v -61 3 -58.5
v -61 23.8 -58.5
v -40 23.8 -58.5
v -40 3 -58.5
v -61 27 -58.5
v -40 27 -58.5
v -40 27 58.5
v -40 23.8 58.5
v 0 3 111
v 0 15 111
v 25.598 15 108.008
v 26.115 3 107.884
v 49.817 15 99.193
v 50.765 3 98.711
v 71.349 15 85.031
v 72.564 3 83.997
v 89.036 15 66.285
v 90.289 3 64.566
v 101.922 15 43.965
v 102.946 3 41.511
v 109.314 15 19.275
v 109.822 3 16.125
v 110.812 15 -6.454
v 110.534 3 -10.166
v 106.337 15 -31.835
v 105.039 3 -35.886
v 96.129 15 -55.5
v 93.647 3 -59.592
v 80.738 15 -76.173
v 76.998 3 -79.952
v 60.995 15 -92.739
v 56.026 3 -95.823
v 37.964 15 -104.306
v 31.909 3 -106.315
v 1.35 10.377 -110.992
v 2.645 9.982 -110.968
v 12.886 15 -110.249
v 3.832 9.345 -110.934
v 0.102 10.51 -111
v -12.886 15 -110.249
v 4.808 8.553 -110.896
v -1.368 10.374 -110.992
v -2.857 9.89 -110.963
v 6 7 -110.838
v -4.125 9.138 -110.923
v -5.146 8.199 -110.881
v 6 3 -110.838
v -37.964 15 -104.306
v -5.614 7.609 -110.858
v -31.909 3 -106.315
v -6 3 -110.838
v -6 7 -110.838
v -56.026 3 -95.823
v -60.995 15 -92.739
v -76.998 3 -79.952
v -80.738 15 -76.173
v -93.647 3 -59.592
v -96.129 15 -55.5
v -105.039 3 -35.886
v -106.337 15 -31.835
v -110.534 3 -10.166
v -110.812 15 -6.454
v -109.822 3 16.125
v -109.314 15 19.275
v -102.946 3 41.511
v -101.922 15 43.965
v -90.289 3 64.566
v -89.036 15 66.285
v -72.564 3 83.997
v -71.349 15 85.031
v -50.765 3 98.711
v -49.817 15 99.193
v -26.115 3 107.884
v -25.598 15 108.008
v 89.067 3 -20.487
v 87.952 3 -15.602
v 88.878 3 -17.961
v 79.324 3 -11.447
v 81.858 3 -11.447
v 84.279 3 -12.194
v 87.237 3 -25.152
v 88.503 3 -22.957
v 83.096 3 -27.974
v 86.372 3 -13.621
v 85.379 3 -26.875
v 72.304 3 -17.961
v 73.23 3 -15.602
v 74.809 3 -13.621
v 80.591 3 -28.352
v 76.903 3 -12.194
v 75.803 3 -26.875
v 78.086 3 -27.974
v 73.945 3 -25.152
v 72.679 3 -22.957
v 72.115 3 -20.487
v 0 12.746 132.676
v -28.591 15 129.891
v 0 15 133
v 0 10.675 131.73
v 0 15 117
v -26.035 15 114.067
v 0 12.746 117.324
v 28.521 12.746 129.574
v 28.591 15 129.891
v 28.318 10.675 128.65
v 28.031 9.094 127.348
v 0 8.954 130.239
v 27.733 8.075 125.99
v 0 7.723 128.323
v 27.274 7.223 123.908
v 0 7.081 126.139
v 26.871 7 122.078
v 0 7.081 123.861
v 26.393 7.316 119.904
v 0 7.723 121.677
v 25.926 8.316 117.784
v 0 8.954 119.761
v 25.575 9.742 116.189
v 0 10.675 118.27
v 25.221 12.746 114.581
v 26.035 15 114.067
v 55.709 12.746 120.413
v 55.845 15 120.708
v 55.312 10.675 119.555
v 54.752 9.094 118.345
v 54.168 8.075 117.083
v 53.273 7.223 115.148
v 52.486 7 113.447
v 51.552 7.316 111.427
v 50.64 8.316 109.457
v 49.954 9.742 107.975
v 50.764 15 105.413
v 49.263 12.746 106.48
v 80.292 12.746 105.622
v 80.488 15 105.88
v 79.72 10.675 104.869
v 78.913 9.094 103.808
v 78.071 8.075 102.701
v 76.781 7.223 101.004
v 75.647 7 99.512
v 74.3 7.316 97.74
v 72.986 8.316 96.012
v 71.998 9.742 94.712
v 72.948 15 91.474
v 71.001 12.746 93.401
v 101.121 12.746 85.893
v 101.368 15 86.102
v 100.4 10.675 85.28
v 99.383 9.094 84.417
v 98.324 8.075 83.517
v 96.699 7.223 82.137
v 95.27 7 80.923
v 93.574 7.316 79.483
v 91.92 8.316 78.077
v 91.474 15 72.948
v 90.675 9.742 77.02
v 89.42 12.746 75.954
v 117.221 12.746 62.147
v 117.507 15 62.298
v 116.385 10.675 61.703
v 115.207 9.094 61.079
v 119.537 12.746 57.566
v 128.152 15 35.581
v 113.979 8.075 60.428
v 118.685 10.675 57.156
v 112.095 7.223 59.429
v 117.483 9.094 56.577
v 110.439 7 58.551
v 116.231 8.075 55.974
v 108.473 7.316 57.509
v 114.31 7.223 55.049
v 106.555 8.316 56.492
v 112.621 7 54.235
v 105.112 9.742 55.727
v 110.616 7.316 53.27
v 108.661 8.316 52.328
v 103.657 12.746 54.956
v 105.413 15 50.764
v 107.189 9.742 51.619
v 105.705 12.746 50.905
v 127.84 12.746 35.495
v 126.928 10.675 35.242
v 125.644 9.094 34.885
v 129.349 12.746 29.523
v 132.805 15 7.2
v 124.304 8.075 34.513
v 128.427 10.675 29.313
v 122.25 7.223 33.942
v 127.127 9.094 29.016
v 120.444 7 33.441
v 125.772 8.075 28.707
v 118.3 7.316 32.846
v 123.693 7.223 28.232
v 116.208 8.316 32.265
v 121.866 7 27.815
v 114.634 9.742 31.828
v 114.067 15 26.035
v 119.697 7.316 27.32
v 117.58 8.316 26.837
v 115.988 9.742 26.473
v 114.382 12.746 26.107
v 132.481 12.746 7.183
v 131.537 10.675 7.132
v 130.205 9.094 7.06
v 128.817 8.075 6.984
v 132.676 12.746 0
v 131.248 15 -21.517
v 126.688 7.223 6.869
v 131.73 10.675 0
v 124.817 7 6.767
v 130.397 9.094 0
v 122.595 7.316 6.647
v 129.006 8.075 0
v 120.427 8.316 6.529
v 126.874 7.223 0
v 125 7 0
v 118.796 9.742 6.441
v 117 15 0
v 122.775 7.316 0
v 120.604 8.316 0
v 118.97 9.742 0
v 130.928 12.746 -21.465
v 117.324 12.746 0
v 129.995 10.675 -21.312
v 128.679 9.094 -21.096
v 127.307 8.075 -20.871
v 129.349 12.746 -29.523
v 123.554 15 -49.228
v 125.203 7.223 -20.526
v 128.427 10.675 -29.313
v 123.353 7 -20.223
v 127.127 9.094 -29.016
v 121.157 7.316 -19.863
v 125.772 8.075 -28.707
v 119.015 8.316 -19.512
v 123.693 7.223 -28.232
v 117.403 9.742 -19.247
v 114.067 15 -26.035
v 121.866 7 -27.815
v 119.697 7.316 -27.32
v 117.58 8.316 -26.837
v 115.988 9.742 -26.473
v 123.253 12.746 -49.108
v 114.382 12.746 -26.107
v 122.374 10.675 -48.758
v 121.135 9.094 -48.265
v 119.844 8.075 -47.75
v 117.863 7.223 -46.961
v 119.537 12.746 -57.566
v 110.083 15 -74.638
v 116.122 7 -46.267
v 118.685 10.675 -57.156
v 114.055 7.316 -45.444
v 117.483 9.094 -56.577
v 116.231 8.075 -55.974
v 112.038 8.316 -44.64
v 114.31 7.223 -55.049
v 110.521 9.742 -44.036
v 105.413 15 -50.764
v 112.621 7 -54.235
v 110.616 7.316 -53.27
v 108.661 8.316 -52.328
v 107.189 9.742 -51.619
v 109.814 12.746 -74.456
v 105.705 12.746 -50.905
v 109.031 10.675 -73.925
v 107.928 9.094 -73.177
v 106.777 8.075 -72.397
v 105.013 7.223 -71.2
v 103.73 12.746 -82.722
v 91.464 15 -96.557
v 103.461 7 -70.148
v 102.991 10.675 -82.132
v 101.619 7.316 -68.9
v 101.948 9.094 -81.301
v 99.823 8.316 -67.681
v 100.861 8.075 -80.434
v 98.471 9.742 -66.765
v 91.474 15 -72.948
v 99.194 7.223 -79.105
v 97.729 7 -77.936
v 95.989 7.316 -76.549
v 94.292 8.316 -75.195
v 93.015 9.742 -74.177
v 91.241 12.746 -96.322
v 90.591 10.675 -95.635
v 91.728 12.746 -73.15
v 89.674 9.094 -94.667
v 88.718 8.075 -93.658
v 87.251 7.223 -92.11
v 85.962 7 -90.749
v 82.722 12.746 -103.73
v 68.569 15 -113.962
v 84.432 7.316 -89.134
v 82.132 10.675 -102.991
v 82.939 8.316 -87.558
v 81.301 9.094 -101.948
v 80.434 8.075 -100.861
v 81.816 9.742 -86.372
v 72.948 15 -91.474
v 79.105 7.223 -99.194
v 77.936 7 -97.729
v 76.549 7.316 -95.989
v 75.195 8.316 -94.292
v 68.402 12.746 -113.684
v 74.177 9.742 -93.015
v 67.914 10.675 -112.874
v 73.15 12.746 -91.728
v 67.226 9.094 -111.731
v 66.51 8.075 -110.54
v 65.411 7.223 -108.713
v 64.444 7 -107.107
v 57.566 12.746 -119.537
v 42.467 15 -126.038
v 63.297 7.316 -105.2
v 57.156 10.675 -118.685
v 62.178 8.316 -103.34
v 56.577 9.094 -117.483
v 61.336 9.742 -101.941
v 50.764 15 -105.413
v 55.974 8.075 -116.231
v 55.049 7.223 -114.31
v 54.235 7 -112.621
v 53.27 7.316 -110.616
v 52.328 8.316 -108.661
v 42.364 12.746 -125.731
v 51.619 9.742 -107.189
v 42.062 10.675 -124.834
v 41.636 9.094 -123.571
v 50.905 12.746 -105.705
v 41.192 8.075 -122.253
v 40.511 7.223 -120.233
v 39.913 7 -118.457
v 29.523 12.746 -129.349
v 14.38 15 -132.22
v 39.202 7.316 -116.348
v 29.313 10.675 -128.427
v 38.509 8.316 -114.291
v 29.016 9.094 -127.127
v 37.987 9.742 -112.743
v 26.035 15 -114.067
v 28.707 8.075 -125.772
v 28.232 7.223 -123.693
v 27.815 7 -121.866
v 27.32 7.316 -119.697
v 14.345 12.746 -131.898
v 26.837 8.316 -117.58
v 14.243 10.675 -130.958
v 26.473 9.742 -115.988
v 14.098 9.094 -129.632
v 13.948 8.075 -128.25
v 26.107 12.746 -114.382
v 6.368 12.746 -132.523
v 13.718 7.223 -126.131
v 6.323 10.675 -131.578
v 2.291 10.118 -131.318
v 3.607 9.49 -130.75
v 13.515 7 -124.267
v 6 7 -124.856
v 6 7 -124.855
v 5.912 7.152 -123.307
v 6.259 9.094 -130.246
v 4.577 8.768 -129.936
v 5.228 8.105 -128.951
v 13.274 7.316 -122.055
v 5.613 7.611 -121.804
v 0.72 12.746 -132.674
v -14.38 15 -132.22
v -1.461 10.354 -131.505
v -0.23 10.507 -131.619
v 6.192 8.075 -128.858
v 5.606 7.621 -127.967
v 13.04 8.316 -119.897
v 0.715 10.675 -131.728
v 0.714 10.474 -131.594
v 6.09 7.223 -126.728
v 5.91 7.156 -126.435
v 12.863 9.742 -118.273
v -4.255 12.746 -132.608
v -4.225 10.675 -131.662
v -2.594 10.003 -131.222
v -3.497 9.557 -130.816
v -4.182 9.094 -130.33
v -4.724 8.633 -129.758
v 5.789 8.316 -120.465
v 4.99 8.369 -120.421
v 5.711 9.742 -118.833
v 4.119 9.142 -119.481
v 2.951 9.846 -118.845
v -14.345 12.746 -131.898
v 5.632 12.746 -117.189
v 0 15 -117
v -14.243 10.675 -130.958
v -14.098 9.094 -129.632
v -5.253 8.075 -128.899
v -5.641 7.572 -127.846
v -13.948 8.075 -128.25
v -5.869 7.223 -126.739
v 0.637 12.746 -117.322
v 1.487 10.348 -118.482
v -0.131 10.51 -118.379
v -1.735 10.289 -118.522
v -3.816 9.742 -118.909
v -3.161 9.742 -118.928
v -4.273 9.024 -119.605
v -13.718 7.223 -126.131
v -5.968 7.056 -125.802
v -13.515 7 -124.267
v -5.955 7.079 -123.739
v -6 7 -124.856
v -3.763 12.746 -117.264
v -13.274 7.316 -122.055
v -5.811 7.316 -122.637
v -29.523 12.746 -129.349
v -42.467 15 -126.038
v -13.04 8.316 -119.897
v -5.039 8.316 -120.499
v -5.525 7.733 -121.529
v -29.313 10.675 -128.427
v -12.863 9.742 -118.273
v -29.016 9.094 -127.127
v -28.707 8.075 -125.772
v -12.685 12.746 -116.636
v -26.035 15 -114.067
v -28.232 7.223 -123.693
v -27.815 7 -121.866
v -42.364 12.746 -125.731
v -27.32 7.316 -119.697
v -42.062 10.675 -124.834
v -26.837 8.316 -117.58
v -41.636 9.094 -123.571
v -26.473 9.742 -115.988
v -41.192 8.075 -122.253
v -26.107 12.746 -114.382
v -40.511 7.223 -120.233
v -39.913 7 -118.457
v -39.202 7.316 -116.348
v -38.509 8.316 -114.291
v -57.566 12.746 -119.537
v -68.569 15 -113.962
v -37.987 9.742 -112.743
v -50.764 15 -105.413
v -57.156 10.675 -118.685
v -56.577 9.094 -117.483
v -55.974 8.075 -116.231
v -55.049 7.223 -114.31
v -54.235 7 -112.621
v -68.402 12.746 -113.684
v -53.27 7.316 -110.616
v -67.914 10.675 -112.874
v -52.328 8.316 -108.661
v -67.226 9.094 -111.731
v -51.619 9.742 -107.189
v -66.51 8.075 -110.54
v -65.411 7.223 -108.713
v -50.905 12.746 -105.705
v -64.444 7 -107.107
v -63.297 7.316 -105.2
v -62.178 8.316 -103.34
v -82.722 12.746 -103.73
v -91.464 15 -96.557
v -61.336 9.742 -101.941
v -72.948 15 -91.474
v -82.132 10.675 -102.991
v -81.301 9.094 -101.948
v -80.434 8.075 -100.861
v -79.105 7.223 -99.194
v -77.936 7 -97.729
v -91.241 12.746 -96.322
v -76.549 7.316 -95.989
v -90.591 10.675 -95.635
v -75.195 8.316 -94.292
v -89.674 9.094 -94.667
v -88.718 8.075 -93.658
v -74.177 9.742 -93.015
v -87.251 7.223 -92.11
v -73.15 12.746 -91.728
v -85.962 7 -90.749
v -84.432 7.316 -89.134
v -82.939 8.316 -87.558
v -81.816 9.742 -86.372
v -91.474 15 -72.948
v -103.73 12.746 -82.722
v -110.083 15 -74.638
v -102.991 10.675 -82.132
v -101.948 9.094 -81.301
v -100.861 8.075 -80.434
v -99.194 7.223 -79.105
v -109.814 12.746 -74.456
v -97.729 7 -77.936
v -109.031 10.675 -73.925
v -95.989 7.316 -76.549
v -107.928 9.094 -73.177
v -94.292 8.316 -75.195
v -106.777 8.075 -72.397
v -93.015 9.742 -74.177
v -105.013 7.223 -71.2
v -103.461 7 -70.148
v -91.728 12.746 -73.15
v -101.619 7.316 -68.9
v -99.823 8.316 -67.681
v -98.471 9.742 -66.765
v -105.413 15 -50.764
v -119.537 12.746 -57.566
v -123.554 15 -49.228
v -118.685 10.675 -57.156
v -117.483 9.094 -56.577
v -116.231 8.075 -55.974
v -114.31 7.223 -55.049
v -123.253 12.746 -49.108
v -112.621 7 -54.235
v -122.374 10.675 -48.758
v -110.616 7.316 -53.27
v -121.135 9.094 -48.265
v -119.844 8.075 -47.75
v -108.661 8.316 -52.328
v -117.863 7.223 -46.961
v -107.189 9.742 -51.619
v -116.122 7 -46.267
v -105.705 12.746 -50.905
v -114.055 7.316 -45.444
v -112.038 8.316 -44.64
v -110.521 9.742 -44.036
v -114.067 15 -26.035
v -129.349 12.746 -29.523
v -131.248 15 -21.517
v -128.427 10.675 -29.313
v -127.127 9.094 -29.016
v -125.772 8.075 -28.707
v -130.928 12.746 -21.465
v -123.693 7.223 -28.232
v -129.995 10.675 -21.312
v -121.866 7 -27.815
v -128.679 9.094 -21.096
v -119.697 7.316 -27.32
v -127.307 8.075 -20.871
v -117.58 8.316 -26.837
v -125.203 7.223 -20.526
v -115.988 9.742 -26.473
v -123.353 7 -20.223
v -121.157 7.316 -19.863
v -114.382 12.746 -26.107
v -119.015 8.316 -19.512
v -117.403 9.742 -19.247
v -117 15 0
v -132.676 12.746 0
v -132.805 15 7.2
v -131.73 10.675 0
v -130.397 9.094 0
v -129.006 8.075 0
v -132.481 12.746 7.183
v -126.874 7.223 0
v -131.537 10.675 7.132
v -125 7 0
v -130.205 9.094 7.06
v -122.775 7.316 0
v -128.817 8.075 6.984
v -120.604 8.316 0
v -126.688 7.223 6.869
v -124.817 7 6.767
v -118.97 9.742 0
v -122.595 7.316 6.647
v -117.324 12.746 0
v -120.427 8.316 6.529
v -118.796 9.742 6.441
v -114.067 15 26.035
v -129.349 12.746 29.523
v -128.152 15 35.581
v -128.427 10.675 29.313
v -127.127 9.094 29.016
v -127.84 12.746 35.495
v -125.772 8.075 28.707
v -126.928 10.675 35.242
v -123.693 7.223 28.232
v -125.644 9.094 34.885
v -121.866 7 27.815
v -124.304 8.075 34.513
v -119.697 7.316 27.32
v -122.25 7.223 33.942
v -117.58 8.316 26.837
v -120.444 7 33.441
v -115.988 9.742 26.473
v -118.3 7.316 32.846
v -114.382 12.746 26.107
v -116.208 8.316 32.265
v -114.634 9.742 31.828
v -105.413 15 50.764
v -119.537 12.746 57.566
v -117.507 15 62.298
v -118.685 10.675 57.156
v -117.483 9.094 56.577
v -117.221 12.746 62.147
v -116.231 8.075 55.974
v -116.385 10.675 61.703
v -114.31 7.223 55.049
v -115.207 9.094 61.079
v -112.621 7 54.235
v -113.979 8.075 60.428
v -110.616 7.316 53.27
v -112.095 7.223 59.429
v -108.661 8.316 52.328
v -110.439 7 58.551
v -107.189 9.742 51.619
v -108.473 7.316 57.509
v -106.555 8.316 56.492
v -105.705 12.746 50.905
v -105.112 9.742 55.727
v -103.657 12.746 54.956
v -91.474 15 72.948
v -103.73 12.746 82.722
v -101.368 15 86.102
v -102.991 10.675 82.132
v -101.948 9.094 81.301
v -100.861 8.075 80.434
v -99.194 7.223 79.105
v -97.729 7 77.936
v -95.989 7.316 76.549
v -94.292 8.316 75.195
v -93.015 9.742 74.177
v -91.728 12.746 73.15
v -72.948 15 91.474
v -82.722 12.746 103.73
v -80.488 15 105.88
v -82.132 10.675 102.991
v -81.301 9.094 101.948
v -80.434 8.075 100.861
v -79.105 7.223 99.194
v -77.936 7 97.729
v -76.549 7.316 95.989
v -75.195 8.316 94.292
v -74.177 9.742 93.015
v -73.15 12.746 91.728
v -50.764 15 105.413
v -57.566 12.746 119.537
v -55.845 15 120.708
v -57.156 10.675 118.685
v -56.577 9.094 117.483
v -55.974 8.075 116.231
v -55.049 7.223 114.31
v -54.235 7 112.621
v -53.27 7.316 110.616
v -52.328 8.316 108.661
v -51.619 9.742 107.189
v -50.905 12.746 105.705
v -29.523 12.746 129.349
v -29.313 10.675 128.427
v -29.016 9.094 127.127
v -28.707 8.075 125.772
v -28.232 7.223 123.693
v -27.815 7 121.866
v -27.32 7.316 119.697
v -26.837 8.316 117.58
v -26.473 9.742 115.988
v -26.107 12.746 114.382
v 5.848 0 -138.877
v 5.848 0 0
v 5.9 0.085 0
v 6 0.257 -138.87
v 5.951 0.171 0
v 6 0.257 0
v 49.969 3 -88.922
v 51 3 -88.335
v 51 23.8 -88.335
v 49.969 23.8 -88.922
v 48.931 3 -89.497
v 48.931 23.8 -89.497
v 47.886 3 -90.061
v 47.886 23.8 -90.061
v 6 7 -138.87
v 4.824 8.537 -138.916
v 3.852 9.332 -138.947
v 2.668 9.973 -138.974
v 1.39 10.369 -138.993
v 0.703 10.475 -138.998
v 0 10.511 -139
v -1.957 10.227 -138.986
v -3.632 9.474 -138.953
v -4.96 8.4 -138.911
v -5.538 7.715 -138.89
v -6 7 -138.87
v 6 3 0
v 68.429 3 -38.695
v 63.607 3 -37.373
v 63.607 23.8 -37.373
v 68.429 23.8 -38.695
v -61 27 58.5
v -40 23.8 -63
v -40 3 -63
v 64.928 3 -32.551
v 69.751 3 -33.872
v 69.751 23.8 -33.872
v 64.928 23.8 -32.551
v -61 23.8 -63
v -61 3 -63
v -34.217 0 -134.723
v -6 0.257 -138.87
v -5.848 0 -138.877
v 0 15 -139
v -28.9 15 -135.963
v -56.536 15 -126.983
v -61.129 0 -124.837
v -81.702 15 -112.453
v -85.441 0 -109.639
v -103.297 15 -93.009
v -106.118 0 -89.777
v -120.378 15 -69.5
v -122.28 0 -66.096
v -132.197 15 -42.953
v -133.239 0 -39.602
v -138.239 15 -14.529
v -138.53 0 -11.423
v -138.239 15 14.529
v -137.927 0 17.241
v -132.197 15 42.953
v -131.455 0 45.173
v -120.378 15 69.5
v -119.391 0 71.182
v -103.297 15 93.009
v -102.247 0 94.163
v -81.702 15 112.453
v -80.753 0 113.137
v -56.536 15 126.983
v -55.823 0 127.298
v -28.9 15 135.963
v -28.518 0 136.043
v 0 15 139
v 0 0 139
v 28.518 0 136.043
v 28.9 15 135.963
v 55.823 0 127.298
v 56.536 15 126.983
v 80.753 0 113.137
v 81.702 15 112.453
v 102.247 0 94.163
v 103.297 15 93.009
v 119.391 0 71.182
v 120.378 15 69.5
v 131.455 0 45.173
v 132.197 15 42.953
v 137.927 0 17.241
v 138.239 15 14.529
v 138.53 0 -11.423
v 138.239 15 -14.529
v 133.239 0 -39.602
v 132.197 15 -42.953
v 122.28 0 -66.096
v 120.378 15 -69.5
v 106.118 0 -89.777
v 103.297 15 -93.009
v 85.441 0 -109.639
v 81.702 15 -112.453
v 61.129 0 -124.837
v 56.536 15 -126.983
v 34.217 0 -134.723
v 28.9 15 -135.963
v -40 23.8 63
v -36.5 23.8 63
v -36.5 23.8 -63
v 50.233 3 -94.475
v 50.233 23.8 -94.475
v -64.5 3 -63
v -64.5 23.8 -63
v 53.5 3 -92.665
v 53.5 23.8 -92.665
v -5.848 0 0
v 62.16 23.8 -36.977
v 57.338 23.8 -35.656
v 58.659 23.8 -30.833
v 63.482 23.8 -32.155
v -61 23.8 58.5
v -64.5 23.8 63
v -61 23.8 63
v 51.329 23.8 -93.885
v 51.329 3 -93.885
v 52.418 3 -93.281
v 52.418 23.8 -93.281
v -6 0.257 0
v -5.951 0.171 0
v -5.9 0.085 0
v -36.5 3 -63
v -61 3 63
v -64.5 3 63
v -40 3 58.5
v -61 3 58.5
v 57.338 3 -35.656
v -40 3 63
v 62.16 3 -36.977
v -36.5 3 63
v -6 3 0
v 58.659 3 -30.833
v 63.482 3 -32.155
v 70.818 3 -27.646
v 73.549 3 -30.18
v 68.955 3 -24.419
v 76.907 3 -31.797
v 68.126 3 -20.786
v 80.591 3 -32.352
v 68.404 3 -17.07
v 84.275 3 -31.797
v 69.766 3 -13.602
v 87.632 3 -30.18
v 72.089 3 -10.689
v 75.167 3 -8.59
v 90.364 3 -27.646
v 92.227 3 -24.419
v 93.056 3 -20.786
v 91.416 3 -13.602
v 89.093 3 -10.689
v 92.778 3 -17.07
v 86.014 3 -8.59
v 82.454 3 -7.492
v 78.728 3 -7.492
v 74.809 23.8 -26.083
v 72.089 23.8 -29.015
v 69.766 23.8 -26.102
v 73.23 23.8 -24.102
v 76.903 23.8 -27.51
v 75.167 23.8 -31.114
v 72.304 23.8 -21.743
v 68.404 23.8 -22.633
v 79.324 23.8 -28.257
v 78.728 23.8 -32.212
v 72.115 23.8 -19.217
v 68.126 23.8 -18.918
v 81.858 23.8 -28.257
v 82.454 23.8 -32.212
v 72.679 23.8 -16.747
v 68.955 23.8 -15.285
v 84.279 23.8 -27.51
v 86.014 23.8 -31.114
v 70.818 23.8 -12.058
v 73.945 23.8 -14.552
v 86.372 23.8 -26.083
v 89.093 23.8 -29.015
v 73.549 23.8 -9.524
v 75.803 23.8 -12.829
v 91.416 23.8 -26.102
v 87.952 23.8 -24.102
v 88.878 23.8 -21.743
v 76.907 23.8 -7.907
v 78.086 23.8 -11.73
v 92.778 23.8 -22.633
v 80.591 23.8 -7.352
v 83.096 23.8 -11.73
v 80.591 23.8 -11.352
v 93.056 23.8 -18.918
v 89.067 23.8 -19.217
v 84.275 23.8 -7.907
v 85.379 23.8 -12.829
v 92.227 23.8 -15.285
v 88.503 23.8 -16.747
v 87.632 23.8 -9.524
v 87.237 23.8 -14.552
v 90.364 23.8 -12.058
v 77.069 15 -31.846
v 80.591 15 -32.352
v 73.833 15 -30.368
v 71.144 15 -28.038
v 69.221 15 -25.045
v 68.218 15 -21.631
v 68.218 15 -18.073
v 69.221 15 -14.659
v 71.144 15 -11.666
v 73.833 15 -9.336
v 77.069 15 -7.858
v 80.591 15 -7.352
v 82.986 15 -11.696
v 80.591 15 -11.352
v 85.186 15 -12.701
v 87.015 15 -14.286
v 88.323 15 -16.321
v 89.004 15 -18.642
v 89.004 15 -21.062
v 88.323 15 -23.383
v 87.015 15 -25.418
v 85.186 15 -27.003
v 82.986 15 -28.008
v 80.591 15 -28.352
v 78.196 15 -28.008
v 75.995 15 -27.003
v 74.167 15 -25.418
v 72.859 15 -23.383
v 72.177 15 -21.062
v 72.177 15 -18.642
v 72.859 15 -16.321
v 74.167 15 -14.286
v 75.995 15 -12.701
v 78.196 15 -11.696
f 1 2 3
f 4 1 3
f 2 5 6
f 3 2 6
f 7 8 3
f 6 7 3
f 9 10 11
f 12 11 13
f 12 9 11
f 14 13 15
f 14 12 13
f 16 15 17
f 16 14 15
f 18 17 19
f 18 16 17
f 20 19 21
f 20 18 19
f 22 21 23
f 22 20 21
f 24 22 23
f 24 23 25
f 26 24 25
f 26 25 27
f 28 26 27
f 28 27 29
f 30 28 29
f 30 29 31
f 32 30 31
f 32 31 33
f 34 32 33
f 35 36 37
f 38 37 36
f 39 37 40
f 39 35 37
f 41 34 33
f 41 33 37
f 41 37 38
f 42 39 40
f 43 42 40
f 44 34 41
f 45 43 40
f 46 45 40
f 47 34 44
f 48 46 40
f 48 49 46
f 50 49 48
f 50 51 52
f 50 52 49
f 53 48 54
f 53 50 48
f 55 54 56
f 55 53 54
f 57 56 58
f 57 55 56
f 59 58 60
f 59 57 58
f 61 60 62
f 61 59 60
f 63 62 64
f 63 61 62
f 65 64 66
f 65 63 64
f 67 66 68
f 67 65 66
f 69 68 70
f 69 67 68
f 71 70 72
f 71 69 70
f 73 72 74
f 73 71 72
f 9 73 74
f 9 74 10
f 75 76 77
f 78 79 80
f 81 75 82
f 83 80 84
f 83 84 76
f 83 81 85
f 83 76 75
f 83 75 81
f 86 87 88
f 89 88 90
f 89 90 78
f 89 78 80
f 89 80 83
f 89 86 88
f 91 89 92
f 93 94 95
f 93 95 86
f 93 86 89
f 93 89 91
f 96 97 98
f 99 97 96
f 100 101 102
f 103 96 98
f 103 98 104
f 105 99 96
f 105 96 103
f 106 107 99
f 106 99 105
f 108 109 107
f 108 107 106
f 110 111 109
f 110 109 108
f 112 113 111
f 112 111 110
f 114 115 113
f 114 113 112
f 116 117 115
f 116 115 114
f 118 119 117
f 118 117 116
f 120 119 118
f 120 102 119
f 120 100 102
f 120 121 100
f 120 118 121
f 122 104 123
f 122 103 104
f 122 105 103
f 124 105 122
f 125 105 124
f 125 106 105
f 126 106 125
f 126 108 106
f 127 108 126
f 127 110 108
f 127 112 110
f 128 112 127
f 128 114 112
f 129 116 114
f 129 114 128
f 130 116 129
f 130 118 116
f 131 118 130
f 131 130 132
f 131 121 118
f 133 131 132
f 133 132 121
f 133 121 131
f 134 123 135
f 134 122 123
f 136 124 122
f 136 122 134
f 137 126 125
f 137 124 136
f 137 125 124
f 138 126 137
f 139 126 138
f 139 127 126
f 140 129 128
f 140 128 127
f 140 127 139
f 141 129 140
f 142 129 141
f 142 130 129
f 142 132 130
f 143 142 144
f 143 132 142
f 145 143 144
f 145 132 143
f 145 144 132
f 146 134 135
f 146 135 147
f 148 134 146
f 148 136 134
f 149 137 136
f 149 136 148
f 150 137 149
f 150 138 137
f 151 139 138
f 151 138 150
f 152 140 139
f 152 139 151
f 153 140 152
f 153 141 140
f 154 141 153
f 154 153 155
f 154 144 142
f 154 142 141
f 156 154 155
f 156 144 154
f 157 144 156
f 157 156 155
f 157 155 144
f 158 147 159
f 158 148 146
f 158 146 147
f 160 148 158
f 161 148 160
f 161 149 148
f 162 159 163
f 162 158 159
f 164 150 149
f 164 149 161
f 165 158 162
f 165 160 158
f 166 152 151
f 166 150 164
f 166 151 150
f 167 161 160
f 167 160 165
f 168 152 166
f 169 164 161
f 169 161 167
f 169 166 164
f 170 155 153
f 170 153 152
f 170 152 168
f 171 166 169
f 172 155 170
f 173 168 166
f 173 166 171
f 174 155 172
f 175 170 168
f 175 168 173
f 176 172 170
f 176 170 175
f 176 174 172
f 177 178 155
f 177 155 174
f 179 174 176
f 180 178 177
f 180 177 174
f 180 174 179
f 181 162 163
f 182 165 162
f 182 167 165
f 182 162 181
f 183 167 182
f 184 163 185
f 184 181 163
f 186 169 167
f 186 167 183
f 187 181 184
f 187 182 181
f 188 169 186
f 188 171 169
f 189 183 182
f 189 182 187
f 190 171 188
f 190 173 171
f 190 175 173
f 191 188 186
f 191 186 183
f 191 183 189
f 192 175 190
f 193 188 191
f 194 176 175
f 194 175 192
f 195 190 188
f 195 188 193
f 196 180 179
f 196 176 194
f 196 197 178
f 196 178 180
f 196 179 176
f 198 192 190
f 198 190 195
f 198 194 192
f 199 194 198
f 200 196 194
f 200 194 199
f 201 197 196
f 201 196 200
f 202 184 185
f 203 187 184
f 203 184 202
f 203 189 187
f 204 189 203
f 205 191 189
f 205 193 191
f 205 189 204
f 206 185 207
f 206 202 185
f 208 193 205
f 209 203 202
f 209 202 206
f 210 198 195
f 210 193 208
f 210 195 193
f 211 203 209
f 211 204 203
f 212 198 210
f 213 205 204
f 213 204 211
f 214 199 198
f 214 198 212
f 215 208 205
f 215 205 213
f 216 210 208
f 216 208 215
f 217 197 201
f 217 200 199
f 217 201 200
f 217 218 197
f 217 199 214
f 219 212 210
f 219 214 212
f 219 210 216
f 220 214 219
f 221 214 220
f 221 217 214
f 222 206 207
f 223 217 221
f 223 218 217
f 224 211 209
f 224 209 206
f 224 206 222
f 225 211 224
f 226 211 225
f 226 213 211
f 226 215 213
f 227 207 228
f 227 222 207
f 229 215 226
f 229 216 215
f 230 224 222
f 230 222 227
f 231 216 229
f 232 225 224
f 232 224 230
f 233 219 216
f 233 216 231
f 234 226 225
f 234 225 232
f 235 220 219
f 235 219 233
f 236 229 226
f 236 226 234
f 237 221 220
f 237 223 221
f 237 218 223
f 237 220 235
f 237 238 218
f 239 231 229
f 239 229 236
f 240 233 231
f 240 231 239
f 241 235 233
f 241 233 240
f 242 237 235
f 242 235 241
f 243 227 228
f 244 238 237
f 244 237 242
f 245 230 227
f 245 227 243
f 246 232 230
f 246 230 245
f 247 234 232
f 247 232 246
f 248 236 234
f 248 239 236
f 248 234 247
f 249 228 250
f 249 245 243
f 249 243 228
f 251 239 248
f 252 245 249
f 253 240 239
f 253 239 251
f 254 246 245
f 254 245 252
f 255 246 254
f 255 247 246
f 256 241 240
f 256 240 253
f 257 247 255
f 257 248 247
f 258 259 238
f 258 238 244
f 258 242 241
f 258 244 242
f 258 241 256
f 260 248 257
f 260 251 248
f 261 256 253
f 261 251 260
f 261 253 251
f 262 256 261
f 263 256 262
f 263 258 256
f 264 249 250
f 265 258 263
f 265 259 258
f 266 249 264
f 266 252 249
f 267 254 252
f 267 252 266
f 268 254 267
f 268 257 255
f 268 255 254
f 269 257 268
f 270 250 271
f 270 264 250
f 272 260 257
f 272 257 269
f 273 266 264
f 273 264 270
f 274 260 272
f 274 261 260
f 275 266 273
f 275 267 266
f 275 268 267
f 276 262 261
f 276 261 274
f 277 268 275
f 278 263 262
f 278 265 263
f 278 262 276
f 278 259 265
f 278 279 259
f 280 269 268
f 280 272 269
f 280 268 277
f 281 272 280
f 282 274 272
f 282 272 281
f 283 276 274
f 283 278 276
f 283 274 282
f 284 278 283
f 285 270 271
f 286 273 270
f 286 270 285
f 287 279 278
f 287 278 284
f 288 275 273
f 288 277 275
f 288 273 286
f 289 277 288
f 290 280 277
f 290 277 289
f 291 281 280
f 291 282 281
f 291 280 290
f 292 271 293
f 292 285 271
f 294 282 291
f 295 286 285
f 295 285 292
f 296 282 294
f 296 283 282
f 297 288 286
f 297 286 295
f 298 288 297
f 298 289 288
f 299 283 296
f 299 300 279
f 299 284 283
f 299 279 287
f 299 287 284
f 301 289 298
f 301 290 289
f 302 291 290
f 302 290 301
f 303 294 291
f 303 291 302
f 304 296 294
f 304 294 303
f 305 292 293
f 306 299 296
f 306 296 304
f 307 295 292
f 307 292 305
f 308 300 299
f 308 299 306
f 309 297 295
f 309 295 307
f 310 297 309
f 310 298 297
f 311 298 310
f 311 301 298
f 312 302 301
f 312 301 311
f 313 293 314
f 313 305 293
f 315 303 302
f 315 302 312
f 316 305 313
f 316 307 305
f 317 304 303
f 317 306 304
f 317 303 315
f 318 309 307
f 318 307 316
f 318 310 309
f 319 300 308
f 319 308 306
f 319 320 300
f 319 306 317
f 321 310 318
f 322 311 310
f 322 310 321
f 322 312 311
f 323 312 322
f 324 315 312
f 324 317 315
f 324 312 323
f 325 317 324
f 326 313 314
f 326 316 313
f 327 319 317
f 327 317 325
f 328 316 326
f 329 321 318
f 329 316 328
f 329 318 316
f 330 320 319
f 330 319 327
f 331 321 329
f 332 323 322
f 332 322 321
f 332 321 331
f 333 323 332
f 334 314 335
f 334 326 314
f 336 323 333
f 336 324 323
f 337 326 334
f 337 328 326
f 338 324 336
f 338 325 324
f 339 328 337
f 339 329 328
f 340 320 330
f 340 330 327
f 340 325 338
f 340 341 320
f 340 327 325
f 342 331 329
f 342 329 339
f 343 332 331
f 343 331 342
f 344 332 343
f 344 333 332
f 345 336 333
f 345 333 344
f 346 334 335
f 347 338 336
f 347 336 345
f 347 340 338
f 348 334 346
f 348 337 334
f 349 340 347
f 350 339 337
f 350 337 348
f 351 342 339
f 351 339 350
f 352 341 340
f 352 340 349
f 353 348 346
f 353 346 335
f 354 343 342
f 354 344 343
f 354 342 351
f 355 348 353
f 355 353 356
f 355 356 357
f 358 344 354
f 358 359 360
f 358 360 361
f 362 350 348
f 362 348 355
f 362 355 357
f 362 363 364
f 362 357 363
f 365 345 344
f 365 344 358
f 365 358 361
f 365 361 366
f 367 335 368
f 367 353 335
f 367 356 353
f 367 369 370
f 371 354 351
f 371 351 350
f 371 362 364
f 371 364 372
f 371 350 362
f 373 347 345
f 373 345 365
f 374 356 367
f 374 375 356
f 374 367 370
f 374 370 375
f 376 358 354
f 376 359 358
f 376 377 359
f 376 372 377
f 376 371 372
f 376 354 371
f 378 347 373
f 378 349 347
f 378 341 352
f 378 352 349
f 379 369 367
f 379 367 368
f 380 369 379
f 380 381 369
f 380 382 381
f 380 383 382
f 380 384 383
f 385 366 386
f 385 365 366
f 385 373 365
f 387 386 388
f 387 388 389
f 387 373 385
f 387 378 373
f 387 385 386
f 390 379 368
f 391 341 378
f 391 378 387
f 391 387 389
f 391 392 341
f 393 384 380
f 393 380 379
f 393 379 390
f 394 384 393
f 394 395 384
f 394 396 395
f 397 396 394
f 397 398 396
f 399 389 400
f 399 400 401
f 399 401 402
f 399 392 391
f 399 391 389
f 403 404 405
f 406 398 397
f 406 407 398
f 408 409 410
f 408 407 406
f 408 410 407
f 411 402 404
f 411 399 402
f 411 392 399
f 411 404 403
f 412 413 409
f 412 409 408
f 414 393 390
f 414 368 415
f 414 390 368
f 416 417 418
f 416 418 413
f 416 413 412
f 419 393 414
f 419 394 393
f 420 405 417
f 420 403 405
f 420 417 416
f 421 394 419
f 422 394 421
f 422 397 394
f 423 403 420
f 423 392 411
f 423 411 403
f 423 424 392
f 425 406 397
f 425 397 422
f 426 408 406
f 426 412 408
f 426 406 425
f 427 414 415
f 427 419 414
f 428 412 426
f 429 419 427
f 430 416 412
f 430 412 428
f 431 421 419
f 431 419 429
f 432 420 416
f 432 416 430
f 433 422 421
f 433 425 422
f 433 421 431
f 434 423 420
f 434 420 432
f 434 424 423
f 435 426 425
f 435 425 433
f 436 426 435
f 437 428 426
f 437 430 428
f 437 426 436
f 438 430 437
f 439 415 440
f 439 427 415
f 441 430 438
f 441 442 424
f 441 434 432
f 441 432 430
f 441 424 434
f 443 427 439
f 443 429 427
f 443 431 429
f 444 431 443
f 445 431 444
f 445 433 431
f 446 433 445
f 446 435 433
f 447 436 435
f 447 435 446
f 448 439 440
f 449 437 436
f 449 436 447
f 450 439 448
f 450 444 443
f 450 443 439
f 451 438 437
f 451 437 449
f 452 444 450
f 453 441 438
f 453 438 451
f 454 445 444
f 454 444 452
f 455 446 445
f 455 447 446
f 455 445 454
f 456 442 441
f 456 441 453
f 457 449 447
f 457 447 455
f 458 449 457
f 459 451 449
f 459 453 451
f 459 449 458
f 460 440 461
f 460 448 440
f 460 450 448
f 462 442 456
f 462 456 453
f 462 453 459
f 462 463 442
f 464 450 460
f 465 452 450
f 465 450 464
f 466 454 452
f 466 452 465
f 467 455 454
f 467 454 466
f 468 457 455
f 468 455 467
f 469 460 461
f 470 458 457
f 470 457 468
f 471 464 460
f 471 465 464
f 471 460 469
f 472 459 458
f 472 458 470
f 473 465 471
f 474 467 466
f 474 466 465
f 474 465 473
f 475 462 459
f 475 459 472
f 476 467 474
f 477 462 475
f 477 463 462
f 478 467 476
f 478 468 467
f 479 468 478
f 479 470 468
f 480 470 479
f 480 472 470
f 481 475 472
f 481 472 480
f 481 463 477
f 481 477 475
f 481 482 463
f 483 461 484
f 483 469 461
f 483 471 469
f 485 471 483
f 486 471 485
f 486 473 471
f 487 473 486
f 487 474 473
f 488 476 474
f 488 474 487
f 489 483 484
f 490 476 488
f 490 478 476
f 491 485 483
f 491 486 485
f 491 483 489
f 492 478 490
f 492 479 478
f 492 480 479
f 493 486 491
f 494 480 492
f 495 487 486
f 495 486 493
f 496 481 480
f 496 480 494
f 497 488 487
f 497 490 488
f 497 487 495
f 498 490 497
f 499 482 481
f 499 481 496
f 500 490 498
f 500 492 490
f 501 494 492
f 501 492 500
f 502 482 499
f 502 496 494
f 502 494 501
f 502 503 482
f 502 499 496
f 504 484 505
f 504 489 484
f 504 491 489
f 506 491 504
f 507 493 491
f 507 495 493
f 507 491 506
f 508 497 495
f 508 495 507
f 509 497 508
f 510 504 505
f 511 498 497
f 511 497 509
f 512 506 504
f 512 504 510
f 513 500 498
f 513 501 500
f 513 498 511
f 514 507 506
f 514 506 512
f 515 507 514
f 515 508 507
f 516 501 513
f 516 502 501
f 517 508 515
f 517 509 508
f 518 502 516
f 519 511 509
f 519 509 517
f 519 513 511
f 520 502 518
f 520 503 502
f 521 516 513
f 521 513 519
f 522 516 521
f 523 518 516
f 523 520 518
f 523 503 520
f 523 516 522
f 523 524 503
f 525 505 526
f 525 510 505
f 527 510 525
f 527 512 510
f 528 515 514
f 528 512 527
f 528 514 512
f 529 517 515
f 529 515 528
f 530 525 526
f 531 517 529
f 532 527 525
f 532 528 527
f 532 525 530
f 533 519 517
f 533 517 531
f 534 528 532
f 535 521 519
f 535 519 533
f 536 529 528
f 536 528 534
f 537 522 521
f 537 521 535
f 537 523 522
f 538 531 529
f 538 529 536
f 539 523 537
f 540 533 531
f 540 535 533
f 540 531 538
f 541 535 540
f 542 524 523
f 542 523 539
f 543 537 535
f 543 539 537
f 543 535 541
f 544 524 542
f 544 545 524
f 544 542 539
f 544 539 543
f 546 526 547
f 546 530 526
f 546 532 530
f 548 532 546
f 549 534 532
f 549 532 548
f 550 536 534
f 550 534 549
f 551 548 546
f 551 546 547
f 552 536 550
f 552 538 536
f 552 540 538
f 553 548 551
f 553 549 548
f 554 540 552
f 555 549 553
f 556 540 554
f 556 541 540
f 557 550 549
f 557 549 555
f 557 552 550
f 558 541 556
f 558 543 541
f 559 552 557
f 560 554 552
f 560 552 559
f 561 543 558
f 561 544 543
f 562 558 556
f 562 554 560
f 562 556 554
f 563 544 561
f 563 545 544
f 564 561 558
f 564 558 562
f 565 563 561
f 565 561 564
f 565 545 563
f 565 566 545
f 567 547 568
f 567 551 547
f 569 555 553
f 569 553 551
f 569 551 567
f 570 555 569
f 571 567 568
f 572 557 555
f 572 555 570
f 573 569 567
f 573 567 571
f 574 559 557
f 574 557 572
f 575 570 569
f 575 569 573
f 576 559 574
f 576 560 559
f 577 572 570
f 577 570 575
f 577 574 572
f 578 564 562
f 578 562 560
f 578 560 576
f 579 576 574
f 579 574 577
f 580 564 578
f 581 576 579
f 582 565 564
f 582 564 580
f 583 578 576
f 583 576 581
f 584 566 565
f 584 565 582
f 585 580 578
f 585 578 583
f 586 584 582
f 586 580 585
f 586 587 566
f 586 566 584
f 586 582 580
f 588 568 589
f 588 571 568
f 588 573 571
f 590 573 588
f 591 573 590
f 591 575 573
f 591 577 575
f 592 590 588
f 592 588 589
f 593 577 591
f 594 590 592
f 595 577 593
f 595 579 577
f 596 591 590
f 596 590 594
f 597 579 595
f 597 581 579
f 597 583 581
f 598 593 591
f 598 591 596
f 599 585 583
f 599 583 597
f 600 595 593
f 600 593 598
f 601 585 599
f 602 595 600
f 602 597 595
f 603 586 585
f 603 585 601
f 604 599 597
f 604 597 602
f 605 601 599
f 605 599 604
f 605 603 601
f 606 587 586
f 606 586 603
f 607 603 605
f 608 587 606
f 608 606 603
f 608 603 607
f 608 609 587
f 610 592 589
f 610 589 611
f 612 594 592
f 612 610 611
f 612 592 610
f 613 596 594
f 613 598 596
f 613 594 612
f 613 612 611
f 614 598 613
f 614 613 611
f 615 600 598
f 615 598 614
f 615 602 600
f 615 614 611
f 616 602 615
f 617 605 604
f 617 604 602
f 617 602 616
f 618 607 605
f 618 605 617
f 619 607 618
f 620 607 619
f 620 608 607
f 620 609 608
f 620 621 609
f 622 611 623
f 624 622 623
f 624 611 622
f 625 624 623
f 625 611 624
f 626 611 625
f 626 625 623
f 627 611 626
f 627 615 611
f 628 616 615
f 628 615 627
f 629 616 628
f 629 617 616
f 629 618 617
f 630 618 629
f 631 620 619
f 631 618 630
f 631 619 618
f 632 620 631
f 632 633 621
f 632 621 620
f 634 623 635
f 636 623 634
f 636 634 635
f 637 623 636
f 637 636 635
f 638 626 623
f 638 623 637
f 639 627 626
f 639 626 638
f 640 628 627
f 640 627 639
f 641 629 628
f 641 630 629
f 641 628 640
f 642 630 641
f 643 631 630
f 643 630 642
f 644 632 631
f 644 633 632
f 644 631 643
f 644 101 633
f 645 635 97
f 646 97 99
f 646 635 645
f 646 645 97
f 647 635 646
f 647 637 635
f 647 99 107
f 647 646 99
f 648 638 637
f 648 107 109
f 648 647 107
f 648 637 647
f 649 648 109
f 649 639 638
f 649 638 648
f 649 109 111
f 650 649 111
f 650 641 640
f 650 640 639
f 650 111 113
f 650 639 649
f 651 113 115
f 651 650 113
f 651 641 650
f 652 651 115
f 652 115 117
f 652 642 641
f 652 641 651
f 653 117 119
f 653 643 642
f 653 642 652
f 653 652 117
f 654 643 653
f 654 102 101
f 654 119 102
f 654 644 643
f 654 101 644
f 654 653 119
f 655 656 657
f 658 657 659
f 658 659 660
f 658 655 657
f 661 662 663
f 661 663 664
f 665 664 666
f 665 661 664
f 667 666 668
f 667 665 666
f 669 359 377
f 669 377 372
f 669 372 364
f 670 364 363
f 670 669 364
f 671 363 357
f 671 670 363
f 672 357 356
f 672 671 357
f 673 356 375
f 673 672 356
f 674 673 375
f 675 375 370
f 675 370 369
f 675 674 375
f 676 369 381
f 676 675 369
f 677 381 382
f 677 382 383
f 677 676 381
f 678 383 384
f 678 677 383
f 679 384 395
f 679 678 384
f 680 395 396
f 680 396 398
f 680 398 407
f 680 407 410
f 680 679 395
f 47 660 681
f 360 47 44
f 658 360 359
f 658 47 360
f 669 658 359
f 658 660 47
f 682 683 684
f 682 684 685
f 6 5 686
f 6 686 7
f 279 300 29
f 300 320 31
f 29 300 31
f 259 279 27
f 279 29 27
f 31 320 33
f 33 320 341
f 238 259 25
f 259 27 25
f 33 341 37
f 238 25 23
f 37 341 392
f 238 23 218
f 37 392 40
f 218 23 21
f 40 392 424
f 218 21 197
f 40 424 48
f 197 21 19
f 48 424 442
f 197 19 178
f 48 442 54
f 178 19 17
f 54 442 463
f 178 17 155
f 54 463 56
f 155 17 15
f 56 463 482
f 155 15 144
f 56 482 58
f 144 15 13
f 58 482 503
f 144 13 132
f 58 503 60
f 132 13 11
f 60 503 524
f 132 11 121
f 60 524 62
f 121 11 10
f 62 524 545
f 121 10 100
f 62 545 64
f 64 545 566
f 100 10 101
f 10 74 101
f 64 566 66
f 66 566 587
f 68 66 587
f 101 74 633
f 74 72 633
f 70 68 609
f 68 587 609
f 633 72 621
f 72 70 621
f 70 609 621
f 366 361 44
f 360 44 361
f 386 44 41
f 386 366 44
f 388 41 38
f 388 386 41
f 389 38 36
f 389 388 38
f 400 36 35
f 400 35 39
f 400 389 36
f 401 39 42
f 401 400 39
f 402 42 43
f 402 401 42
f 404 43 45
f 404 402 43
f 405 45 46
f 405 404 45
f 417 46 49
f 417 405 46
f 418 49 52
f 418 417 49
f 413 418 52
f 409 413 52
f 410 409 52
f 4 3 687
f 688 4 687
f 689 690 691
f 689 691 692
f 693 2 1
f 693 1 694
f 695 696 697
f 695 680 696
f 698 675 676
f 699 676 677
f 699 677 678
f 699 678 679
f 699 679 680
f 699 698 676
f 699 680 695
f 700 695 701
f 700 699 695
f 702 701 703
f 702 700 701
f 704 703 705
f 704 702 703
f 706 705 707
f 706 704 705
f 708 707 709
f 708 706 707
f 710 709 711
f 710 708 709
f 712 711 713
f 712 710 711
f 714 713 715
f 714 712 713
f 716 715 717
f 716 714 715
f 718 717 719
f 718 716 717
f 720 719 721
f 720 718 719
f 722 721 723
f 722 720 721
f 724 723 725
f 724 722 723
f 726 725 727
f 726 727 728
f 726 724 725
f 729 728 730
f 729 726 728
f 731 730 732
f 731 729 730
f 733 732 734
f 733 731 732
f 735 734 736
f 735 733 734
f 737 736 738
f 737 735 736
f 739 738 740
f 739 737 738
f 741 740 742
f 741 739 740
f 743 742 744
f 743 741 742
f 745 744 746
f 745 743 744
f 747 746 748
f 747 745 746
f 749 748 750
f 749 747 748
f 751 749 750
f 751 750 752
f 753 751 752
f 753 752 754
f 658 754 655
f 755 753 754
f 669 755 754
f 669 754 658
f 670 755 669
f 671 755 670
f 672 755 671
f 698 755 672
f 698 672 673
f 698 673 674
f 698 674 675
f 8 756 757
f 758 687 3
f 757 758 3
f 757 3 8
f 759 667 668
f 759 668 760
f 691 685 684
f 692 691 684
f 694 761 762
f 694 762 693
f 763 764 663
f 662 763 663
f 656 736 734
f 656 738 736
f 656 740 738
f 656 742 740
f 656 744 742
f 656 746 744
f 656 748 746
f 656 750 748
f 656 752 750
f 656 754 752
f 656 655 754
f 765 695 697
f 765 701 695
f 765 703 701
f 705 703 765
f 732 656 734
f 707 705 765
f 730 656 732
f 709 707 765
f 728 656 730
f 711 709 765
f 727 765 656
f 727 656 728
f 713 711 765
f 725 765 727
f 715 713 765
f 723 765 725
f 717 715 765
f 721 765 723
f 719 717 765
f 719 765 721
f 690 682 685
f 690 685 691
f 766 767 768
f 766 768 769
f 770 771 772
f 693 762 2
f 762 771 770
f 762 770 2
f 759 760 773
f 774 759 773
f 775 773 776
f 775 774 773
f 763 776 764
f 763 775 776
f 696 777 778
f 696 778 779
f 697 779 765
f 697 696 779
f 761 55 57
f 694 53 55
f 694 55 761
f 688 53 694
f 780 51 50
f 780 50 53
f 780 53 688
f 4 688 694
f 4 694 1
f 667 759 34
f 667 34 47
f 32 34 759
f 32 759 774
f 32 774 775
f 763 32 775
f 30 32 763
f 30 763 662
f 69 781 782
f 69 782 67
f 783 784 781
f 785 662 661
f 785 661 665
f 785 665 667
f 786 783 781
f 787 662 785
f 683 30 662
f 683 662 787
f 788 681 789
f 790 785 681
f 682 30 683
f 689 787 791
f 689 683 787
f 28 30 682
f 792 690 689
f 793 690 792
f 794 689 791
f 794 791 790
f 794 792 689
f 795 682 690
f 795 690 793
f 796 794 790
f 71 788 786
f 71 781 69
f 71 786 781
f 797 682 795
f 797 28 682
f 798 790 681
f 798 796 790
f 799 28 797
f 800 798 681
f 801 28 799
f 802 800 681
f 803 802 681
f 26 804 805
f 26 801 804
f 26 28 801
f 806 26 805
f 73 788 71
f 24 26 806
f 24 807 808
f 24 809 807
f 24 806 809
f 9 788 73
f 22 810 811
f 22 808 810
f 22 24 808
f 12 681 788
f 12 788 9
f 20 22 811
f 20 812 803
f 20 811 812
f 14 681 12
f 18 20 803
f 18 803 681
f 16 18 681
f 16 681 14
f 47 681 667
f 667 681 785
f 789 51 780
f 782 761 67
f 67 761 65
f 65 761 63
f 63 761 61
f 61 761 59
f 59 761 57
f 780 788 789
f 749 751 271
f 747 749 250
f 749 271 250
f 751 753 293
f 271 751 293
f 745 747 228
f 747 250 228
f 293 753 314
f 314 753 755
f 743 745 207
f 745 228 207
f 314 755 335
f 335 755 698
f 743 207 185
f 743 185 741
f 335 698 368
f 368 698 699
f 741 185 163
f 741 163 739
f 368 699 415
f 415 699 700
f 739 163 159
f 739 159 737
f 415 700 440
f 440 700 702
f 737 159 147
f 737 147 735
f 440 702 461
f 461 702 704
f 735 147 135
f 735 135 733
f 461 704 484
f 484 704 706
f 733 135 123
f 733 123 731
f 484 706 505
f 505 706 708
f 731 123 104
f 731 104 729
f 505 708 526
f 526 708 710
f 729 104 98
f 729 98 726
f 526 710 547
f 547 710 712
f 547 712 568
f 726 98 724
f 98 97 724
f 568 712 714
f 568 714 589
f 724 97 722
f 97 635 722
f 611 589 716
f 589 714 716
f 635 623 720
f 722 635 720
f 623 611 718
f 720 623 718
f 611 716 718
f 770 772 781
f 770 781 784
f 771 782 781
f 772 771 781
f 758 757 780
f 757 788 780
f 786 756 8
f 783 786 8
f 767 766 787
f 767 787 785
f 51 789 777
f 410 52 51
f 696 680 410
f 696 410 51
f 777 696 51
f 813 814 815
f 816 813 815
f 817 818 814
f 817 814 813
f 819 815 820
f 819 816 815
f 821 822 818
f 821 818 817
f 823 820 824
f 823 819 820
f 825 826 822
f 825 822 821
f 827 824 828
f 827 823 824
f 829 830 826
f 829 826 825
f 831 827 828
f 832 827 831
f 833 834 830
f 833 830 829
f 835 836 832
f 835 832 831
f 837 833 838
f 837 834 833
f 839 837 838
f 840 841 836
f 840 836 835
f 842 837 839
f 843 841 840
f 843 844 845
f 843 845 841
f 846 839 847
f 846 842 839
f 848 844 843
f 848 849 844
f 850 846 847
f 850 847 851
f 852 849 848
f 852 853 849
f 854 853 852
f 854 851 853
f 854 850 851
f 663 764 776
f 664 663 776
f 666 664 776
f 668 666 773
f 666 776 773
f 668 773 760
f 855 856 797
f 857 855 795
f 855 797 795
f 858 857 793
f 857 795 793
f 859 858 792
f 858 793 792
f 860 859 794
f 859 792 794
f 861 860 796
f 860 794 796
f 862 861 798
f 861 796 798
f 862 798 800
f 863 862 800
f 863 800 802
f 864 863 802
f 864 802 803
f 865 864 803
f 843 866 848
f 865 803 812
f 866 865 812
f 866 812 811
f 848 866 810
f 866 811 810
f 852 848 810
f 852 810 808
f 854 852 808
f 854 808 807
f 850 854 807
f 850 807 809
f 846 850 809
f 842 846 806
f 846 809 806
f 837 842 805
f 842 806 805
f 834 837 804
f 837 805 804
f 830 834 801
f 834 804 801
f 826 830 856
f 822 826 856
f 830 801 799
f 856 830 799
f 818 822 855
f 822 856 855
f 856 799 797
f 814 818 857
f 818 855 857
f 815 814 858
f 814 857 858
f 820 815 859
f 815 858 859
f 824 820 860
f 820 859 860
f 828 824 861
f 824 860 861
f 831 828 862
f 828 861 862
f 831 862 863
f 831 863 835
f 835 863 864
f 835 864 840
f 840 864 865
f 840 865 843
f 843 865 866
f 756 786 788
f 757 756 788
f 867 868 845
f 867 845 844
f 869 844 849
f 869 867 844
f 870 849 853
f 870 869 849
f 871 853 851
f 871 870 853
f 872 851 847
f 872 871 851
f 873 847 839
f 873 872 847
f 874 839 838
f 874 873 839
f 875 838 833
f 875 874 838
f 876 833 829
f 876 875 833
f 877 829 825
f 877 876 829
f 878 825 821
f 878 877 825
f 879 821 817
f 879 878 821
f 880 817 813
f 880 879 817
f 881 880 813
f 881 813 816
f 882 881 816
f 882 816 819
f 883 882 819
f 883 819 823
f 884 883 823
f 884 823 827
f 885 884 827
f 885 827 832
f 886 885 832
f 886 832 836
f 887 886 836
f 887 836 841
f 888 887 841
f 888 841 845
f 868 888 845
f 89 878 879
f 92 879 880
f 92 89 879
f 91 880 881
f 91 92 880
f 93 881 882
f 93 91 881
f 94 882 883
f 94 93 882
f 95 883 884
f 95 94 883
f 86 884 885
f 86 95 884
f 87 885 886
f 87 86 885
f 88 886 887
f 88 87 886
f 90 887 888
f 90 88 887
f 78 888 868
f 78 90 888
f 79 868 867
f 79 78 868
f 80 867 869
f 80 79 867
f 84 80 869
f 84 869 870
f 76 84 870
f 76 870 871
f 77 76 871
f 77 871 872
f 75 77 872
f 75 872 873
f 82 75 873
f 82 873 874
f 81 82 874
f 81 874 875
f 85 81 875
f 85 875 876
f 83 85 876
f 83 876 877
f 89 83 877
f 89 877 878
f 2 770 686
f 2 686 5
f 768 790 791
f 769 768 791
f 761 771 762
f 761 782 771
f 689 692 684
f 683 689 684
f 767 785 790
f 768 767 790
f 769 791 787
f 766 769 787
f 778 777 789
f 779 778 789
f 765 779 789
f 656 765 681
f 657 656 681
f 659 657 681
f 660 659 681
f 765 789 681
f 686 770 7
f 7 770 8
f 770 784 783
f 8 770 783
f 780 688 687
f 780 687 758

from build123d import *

# Parameters (mm, degrees)
SKETCH1_W                = 139
SKETCH1_H                = 15
SKETCH4_W                = 21
SKETCH4_H                = 117
BOSS_EXTRUDE1_DEPTH      = 12
SKETCH5_R                = 12.5
SKETCH5_R_2              = 8.5
BOSS_EXTRUDE2_DEPTH      = 8.8
BOSS_EXTRUDE3_DEPTH      = 8.8
SKETCH11_W               = 28
SKETCH11_H               = 126
SKETCH11_W_2             = 21
SKETCH11_H_2             = 117
BOSS_EXTRUDE5_DEPTH      = 8.8
CUT_EXTRUDE1_START       = -12
SKETCH13_R               = 111
SKETCH13_R_2             = 12.5
SKETCH13_W               = 28
SKETCH13_H               = 126
SKETCH13_R_3             = 8.5
CUT_EXTRUDE1_DEPTH       = 12
BOSS_EXTRUDE6_DEPTH      = 8.8
BOSS_EXTRUDE6_DEPTH_BACK = 12
SKETCH14_W               = 21
SKETCH14_H               = 4.5
CUT_EXTRUDE2_DEPTH       = 20.8
CUT_EXTRUDE3_START       = -139
CUT_EXTRUDE3_DEPTH       = 139


# Read off the part's stored shape, not the designer's step: Cut-Extrude3
with BuildPart() as part:
    # Sketch1 → Revolve1 (revolve)
    with BuildSketch(Plane.XY, mode=Mode.PRIVATE) as revolve1_sk:
        with Locations((69.5, 7.5)):
            Rectangle(SKETCH1_W, SKETCH1_H)
    revolve(revolve1_sk.sketch.rotate(Axis((0, 4.511025306, 0), (0, 1, 0)), 90), axis=Axis((0, 4.511025306, 0), (0, 1, 0)))

    # Sketch4 → Boss-Extrude1 (add)
    with BuildSketch(Plane(origin=(0, 15, 0), x_dir=(1, 0, 0), z_dir=(0, 1, 0))):
        with Locations((-50.5, 0)):
            Rectangle(SKETCH4_W, SKETCH4_H)
    extrude(amount=BOSS_EXTRUDE1_DEPTH)

    # Sketch5 → Boss-Extrude2 (add)
    with BuildSketch(Plane(origin=(0, 15, 0), x_dir=(1, 0, 0), z_dir=(0, 1, 0))):
        with Locations(Location((80.590940898, 19.851958221, 0), (0, 0, 270))):
            Circle(SKETCH5_R)
        with Locations(Location((80.590940898, 19.851958221, 0), (0, 0, 270))):
            Circle(SKETCH5_R_2, mode=Mode.SUBTRACT)
    extrude(amount=BOSS_EXTRUDE2_DEPTH)

    # Sketch9 → Boss-Extrude3 (add)
    with BuildSketch(Plane(origin=(0, 15, 0), x_dir=(1, 0, 0), z_dir=(0, 1, 0))):
        with BuildLine():
            Line((47.886099404, 90.060654472), (50.233457218, 94.475392436))
            ThreePointArc((50.233457218, 94.475392436), (51.874629366, 93.584308664), (53.5, 92.664718205))
            Line((53.5, 92.664718205), (51, 88.334591186))
            ThreePointArc((51, 88.334591186), (49.450581265, 89.211210128), (47.886099404, 90.060654472))
        make_face()
    extrude(amount=BOSS_EXTRUDE3_DEPTH)

    # Sketch11 → Boss-Extrude5 (add)
    with BuildSketch(Plane(origin=(0, 15, 0), x_dir=(1, 0, 0), z_dir=(0, 1, 0))):
        with Locations((-50.5, 0)):
            Rectangle(SKETCH11_W, SKETCH11_H)
        with Locations((-50.5, 0)):
            Rectangle(SKETCH11_W_2, SKETCH11_H_2, mode=Mode.SUBTRACT)
    extrude(amount=BOSS_EXTRUDE5_DEPTH)

    # Sketch13 → Cut-Extrude1 (cut)
    # profile 1 of 2: a face of its own
    with BuildSketch(Plane(origin=(0, 15, 0), x_dir=(1, 0, 0), z_dir=(0, 1, 0)).offset(CUT_EXTRUDE1_START)):
        with Locations(Location((0, 0, 0), (0, 0, 270))):
            Circle(SKETCH13_R)
        with Locations(Location((80.590940898, 19.851958221, 0), (0, 0, 90))):
            Circle(SKETCH13_R_2, mode=Mode.SUBTRACT)
        with BuildLine():
            ThreePointArc((50.233457218, 94.475392436), (51.874629366, 93.584308664), (53.5, 92.664718205))
            Line((53.5, 92.664718205), (51, 88.334591186))
            ThreePointArc((51, 88.334591186), (49.450581265, 89.211210128), (47.886099404, 90.060654472))
            Line((47.886099404, 90.060654472), (50.233457218, 94.475392436))
        make_face(mode=Mode.SUBTRACT)
        with Locations((-50.5, 0)):
            Rectangle(SKETCH13_W, SKETCH13_H, mode=Mode.SUBTRACT)
    # profile 2 of 2: a face of its own
    with BuildSketch(Plane(origin=(0, 15, 0), x_dir=(1, 0, 0), z_dir=(0, 1, 0)).offset(CUT_EXTRUDE1_START)):
        with Locations(Location((80.590940898, 19.851958221, 0), (0, 0, 90))):
            Circle(SKETCH13_R_3)
    extrude(amount=CUT_EXTRUDE1_DEPTH, mode=Mode.SUBTRACT)

    # Sketch12 → Boss-Extrude6 (add, two sides: drawn at the far end of the back side and taken through both)
    with BuildSketch(Plane(origin=(0, 15, 0), x_dir=(1, 0, 0), z_dir=(0, 1, 0)).offset(-BOSS_EXTRUDE6_DEPTH_BACK)):
        Polygon((64.928294207, 32.551017187), (63.606991435, 37.373273815), (68.429248063, 38.694576587), (69.750550835, 33.872319959), align=None)
        Polygon((63.481617219, 32.154626355), (62.160314446, 36.976882983), (57.338057819, 35.655580211), (58.659360591, 30.833323583), align=None)
    extrude(amount=BOSS_EXTRUDE6_DEPTH + BOSS_EXTRUDE6_DEPTH_BACK)

    # Sketch14 → Cut-Extrude2 (cut)
    with BuildSketch(Plane(origin=(0, 23.8, 0), x_dir=(1, 0, 0), z_dir=(0, 1, 0))):
        with Locations((-50.5, -60.75)):
            Rectangle(SKETCH14_W, SKETCH14_H)
        with Locations((-50.5, 60.75)):
            Rectangle(SKETCH14_W, SKETCH14_H)
    extrude(amount=-CUT_EXTRUDE2_DEPTH, mode=Mode.SUBTRACT)

    # Cut-Extrude3 outline → Cut-Extrude3 (cut)
    with BuildSketch(Plane.XY.offset(CUT_EXTRUDE3_START)):
        with BuildLine():
            ThreePointArc((5.848066516, 0), (5.925428493, 0.127755535), (6, 0.257159717))
            Line((6, 0.257159717), (6, 7))
            ThreePointArc((6, 7), (0, 10.510910407), (-6, 7))
            Line((-6, 7), (-6, 0.257159717))
            ThreePointArc((-6, 0.257159717), (-5.925428493, 0.127755535), (-5.848066516, 0))
            Line((-5.848066516, 0), (5.848066516, 0))
        make_face()
    extrude(amount=CUT_EXTRUDE3_DEPTH, mode=Mode.SUBTRACT)

    # Sketch2 → Cut-Revolve1 (revolve, cut)
    with BuildSketch(Plane.XY, mode=Mode.PRIVATE) as cut_revolve1_sk:
        with BuildLine():
            Line((117, 15), (133, 15))
            ThreePointArc((133, 15), (125, 7), (117, 15))
        make_face()
    revolve(cut_revolve1_sk.sketch.rotate(Axis((0, 15, 0), (0, 1, 0)), 270), axis=Axis((0, 15, 0), (0, 1, 0)), mode=Mode.SUBTRACT)


solid = part.part
